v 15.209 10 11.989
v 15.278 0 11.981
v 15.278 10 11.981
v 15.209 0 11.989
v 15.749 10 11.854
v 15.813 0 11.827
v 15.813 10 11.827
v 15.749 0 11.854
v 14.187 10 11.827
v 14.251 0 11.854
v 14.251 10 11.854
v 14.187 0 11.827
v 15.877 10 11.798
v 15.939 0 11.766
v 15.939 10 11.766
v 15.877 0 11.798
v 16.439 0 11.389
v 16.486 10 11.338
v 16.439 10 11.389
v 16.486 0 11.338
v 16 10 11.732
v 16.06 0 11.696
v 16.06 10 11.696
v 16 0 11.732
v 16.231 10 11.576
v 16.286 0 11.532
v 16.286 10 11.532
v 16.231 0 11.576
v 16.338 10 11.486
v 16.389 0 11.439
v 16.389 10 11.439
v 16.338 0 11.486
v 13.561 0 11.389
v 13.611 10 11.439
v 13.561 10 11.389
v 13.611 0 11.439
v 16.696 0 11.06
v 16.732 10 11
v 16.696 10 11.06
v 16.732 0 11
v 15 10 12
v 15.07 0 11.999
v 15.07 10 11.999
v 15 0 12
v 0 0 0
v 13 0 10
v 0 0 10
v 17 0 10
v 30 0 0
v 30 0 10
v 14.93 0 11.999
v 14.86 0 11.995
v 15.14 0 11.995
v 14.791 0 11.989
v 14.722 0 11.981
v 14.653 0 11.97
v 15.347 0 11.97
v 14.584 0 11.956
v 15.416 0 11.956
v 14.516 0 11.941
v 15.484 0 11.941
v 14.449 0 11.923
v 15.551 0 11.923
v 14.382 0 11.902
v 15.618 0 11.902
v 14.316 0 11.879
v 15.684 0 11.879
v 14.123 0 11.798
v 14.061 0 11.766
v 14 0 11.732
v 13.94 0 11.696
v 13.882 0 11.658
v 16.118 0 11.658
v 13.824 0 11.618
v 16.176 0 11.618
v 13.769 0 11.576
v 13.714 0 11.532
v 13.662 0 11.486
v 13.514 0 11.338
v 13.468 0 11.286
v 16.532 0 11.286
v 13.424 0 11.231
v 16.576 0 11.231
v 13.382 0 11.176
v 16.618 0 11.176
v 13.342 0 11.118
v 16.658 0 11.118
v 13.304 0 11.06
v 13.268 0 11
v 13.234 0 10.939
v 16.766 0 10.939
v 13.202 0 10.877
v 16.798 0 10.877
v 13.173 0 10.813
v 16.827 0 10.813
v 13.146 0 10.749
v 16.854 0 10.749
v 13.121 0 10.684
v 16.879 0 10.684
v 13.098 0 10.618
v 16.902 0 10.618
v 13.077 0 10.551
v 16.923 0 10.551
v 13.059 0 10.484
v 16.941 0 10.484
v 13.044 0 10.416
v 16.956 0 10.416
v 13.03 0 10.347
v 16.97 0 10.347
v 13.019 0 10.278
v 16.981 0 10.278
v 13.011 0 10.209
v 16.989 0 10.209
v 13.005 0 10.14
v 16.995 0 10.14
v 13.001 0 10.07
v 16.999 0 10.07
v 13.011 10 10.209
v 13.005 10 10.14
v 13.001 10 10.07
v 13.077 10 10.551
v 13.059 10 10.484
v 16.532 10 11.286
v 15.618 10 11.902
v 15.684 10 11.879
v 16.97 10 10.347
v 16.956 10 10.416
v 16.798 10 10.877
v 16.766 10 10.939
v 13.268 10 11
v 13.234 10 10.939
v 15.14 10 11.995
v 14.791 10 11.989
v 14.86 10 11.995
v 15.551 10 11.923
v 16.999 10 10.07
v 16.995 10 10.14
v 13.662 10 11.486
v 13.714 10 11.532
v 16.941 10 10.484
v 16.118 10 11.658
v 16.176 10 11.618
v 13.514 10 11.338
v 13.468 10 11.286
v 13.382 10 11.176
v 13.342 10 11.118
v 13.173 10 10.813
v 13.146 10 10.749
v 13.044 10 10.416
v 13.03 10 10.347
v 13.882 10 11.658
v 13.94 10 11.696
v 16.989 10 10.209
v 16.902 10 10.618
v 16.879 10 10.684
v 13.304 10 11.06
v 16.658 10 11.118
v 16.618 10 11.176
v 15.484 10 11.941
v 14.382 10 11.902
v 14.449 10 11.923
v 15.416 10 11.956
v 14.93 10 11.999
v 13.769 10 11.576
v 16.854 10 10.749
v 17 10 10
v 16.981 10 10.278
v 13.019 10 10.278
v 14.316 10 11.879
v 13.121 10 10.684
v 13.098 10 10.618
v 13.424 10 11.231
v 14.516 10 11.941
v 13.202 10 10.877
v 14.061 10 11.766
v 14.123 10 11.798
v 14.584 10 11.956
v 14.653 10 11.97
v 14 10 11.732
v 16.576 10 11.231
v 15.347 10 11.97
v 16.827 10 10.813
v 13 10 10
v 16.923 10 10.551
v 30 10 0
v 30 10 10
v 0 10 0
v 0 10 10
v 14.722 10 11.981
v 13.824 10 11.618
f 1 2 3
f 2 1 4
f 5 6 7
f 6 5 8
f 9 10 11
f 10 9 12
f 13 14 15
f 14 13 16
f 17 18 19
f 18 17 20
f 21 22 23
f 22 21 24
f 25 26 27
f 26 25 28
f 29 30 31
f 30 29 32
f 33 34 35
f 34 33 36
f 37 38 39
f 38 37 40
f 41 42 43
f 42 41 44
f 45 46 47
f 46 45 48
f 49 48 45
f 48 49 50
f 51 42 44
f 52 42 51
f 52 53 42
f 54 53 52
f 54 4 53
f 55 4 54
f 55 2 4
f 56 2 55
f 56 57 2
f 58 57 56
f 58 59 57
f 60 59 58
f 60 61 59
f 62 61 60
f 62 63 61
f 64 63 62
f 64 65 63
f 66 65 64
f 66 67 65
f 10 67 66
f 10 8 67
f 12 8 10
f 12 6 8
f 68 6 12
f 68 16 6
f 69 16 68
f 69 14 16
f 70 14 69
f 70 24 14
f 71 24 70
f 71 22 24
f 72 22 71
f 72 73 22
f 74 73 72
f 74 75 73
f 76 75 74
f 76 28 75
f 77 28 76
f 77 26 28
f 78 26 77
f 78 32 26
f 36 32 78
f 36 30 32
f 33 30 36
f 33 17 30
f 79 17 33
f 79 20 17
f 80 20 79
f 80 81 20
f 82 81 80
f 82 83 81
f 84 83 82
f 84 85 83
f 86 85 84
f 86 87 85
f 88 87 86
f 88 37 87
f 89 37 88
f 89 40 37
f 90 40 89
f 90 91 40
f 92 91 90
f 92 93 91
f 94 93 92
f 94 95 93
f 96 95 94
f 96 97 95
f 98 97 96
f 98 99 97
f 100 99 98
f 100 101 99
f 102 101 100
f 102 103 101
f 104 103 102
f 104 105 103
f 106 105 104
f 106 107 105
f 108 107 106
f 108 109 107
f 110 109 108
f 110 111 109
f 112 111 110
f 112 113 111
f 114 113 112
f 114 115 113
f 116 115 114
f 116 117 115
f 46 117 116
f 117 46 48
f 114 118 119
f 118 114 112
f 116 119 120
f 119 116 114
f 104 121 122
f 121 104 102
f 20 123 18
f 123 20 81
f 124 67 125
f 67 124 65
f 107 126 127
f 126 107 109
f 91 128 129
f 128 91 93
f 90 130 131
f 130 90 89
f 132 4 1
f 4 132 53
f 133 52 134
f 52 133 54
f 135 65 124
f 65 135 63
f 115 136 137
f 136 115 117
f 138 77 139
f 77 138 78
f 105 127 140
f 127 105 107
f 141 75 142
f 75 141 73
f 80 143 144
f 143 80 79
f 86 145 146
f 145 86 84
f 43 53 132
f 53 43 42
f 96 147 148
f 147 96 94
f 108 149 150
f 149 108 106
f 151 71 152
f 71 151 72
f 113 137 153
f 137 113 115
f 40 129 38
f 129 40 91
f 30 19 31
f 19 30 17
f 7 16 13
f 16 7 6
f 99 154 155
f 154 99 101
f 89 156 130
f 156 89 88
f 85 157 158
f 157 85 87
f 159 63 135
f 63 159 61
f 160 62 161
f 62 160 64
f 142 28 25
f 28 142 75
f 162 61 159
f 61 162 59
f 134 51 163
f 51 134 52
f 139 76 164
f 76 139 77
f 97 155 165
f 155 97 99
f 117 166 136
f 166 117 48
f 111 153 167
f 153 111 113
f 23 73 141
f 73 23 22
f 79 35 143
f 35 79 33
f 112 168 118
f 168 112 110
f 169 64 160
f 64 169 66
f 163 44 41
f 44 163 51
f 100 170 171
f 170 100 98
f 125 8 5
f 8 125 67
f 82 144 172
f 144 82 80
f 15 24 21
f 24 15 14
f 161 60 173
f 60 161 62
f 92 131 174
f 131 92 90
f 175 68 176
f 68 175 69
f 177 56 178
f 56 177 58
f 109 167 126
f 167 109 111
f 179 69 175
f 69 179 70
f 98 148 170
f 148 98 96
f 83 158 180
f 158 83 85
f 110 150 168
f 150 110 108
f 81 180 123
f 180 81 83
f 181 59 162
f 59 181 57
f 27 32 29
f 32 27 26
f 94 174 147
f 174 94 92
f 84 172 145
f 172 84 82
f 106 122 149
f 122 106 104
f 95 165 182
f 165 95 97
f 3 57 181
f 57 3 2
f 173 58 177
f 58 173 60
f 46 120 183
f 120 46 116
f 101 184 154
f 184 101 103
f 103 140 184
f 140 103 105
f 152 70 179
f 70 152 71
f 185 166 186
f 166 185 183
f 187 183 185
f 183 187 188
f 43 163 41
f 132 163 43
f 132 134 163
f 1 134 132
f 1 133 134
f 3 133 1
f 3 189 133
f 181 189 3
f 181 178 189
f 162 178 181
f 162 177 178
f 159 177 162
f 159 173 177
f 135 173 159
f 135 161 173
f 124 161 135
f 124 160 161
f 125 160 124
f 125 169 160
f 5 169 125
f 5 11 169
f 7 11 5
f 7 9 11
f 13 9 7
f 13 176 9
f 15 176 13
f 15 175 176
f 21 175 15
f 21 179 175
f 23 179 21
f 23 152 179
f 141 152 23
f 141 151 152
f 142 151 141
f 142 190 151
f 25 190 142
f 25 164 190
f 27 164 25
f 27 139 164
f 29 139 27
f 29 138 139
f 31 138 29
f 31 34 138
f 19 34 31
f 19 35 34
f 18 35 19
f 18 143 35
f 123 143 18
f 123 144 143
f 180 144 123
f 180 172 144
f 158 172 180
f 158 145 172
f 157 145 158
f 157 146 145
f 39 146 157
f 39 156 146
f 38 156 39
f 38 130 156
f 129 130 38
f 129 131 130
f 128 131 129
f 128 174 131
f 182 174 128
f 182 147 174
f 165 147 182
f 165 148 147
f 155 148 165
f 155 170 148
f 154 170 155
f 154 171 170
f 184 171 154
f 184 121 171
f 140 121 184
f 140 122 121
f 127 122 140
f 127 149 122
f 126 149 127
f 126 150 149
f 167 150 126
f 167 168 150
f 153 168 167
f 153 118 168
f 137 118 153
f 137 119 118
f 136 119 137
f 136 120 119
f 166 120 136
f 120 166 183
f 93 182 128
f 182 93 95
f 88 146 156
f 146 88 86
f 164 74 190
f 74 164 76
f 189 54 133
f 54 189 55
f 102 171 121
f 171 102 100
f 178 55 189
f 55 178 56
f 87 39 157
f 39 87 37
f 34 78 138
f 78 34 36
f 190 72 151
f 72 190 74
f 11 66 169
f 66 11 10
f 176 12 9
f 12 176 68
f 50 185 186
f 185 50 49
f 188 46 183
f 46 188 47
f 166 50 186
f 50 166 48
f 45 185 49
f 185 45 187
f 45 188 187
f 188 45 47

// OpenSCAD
cube([30, 10, 10]);
intersection() {
	translate([15, 0, 10]) {
		rotate([-90, 0, 0]) {
			cylinder(r=2, h=10, $fn=180);
		}
	}
	cube([30, 10, 20]);
}
